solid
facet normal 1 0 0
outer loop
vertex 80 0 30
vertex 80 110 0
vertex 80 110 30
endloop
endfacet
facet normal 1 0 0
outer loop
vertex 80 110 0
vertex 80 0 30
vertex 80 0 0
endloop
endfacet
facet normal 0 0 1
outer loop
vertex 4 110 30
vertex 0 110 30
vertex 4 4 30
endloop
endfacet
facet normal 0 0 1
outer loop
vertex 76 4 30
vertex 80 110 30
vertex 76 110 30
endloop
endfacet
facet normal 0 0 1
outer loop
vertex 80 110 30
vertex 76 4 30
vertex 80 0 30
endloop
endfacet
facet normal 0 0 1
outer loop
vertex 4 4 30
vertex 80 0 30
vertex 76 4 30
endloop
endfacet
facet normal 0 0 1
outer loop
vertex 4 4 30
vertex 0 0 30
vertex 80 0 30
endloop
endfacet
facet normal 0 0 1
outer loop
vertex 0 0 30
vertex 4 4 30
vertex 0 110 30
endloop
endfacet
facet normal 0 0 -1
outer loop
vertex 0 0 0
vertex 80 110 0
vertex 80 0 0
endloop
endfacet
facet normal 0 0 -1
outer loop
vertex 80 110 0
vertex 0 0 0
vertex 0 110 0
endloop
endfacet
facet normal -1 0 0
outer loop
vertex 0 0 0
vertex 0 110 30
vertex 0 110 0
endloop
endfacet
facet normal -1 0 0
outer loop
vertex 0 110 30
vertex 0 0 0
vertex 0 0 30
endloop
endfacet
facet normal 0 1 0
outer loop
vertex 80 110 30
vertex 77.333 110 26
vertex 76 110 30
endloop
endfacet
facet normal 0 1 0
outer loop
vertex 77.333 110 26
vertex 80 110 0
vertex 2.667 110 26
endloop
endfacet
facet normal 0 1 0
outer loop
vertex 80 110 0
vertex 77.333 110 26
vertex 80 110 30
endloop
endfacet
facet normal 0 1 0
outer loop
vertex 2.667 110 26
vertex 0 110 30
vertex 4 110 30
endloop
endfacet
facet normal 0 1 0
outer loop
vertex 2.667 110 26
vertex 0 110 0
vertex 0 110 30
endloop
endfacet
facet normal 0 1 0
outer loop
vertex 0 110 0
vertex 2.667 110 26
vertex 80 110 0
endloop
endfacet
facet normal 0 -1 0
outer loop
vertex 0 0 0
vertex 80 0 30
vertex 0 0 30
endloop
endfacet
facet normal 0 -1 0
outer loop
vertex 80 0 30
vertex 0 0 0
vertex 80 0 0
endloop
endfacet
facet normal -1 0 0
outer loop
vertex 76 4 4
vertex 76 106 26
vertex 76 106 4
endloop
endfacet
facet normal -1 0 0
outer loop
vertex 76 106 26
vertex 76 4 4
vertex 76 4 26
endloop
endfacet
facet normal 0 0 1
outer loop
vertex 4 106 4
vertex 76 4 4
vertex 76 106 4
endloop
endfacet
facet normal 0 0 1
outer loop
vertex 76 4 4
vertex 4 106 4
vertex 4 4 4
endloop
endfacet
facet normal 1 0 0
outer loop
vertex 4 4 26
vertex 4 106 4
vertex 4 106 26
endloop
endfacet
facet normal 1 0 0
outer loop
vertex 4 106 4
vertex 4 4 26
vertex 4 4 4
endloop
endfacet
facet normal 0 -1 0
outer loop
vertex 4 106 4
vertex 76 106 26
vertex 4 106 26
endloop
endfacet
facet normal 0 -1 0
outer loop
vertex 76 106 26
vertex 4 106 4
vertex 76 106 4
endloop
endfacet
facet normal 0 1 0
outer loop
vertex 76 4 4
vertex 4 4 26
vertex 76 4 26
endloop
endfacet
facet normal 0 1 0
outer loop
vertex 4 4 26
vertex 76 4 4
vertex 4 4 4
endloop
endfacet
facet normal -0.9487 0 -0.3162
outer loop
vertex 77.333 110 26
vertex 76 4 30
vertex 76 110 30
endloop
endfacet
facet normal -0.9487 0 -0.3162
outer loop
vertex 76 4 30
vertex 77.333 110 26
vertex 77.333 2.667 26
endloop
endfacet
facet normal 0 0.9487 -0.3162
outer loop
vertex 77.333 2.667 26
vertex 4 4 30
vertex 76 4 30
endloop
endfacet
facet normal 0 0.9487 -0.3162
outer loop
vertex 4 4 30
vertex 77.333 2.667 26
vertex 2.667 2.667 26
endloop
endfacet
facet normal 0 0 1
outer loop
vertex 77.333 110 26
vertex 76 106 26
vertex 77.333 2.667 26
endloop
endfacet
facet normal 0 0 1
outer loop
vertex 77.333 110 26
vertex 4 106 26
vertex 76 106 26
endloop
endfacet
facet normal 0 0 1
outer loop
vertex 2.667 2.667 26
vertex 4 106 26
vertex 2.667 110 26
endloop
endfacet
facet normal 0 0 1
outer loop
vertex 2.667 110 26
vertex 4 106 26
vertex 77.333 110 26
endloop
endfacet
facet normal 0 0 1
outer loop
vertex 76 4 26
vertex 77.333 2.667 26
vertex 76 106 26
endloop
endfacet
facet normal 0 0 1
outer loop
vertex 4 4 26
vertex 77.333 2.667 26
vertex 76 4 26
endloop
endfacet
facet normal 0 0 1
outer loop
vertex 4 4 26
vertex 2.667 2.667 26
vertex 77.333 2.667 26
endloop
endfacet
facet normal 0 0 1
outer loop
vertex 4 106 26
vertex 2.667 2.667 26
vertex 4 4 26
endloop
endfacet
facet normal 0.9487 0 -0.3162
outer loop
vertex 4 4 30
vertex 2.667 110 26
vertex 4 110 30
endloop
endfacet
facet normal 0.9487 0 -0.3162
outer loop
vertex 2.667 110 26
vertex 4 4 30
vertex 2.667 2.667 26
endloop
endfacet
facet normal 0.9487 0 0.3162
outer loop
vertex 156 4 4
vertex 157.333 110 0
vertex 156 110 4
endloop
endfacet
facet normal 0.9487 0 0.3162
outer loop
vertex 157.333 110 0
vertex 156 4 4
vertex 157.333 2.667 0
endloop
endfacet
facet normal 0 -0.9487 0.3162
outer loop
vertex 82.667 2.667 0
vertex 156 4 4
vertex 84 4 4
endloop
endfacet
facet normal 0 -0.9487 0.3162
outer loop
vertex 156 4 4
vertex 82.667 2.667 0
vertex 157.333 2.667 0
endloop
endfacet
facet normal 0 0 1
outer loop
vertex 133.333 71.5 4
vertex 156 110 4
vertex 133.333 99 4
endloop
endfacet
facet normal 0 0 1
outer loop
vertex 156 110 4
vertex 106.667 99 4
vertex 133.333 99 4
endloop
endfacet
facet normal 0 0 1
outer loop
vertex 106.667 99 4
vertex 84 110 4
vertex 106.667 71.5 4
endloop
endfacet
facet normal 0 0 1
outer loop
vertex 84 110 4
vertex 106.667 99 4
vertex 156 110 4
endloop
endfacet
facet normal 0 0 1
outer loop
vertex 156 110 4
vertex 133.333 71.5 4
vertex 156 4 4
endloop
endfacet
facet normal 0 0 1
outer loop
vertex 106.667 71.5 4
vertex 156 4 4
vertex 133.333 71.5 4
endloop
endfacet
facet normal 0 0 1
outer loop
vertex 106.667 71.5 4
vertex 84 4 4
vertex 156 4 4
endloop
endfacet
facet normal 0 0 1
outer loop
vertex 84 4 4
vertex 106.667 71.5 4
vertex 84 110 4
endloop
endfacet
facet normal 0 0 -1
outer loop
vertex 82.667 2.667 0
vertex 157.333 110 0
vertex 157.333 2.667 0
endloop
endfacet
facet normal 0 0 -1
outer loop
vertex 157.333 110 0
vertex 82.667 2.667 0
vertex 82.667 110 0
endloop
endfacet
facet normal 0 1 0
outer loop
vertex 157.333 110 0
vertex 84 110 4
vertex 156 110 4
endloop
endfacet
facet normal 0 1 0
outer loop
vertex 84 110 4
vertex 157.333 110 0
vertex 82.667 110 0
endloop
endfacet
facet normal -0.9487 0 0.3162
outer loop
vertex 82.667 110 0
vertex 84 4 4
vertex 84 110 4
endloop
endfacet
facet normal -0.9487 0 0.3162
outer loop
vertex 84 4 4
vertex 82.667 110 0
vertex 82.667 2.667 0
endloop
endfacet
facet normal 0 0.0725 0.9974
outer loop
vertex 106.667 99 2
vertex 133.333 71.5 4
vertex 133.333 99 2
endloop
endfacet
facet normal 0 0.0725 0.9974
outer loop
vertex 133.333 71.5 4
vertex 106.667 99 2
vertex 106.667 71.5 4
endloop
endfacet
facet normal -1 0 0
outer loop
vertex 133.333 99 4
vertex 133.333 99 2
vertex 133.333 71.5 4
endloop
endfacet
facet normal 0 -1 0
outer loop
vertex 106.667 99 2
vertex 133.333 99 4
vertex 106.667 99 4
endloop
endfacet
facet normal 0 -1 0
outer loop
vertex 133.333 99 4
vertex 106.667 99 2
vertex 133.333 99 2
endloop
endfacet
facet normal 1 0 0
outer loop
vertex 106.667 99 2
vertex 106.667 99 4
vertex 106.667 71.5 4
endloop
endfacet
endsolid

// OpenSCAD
module slide_top_box(
	// parameterized box with sliding dovetail top
	// v1.1.0
	size=[80, 110, 30], // x (width), y (length), z (height)
	thickness=4, // walls and lid
	lid_inset=0, // distance from top of box to top of lid (0 for flush)
	has_finger_recess=true, // optional finger grip indent
	is_interior_size=false, // when true, size defines interior volume, walls extend beyond
) {
  
	module box(size, thickness) {
	  difference () {
	    cube(size=[size.x, size.y, size.z], center=false);
	    translate([thickness, thickness, thickness])
	      cube(size=[size.x-thickness*2, size.y-thickness*2, size.z-thickness*1], center=false);
	  };
	}

	module lid(size, ridge, recess=undef) {
	  t  = size.z;
	  hx = size.x / 2;
	  hy = size.y / 2;

	  translate([hx, hy, 0])
		difference() {
	    // lid plate: trapezoid prism
			polyhedron(
				points = [
					// top points, clockwise starting at max x, max y
					[  hx - t,    hy,      t], // 0
					[  hx - t,  -(hy - t), t], // 1
					[-(hx - t), -(hy - t), t], // 2
					[-(hx - t),   hy,      t], // 3

					// bottom points (with ridge), clockwise starting at max x, max y
					[  hx - t+ridge,    hy,            0], // 4
					[  hx - t+ridge,  -(hy - t+ridge), 0], // 5
					[-(hx - t+ridge), -(hy - t+ridge), 0], // 6
					[-(hx - t+ridge),   hy,            0], // 7
				],
				faces = [
	        [0, 1, 2, 3], // top face
					[0, 4, 5, 1], // left slope
					[1, 5, 6, 2], // back slope
					[3, 2, 6, 7], // right slope
					[0, 3, 7, 4], // front face
					[7, 6, 5, 4], // bottom face
				]
			);
	    // lid recess: triangle prism
	    if (recess != undef) {
	      lrx = recess.x;
	      lry = recess.y;
	      lrz = recess.z;
        leading_edge = min(hy-lry-t*2, hy*.8-lry);
	      translate([-lrx/2, leading_edge, t])
	        polyhedron(
	          points=[ [0,0,0], [lrx,0,0], [lrx,lry,-lrz], [0,lry,-lrz], [0,lry,0], [lrx,lry,0] ],
	          faces=[ [0,1,2,3], [5,4,3,2], [0,4,5,1], [0,3,4], [5,2,1] ]
	        );
	    }
		};
	}

	box_size = is_interior_size ? size + [thickness*2, thickness*2, thickness*2] : size;
	lid_size = [box_size.x, box_size.y, thickness];
	lid_groove = thickness / 3; // how deep into the box wall should the lid groove cut
	lid_recess = has_finger_recess ? [box_size.x / 3, box_size.y / 4, thickness / 2] : undef; // use undef for none

	// box
	difference () {
	  box(size=box_size, thickness=thickness);
	  // subtract lid to create sliding groove
	  translate([0, 0, box_size.z - lid_inset - lid_size.z])
	    lid(size=lid_size, ridge=lid_groove);
	}

	// lid, next to box
	translate([box_size.x, 0, 0])
		lid(size=lid_size, ridge=lid_groove, recess=lid_recess);

}

slide_top_box();
